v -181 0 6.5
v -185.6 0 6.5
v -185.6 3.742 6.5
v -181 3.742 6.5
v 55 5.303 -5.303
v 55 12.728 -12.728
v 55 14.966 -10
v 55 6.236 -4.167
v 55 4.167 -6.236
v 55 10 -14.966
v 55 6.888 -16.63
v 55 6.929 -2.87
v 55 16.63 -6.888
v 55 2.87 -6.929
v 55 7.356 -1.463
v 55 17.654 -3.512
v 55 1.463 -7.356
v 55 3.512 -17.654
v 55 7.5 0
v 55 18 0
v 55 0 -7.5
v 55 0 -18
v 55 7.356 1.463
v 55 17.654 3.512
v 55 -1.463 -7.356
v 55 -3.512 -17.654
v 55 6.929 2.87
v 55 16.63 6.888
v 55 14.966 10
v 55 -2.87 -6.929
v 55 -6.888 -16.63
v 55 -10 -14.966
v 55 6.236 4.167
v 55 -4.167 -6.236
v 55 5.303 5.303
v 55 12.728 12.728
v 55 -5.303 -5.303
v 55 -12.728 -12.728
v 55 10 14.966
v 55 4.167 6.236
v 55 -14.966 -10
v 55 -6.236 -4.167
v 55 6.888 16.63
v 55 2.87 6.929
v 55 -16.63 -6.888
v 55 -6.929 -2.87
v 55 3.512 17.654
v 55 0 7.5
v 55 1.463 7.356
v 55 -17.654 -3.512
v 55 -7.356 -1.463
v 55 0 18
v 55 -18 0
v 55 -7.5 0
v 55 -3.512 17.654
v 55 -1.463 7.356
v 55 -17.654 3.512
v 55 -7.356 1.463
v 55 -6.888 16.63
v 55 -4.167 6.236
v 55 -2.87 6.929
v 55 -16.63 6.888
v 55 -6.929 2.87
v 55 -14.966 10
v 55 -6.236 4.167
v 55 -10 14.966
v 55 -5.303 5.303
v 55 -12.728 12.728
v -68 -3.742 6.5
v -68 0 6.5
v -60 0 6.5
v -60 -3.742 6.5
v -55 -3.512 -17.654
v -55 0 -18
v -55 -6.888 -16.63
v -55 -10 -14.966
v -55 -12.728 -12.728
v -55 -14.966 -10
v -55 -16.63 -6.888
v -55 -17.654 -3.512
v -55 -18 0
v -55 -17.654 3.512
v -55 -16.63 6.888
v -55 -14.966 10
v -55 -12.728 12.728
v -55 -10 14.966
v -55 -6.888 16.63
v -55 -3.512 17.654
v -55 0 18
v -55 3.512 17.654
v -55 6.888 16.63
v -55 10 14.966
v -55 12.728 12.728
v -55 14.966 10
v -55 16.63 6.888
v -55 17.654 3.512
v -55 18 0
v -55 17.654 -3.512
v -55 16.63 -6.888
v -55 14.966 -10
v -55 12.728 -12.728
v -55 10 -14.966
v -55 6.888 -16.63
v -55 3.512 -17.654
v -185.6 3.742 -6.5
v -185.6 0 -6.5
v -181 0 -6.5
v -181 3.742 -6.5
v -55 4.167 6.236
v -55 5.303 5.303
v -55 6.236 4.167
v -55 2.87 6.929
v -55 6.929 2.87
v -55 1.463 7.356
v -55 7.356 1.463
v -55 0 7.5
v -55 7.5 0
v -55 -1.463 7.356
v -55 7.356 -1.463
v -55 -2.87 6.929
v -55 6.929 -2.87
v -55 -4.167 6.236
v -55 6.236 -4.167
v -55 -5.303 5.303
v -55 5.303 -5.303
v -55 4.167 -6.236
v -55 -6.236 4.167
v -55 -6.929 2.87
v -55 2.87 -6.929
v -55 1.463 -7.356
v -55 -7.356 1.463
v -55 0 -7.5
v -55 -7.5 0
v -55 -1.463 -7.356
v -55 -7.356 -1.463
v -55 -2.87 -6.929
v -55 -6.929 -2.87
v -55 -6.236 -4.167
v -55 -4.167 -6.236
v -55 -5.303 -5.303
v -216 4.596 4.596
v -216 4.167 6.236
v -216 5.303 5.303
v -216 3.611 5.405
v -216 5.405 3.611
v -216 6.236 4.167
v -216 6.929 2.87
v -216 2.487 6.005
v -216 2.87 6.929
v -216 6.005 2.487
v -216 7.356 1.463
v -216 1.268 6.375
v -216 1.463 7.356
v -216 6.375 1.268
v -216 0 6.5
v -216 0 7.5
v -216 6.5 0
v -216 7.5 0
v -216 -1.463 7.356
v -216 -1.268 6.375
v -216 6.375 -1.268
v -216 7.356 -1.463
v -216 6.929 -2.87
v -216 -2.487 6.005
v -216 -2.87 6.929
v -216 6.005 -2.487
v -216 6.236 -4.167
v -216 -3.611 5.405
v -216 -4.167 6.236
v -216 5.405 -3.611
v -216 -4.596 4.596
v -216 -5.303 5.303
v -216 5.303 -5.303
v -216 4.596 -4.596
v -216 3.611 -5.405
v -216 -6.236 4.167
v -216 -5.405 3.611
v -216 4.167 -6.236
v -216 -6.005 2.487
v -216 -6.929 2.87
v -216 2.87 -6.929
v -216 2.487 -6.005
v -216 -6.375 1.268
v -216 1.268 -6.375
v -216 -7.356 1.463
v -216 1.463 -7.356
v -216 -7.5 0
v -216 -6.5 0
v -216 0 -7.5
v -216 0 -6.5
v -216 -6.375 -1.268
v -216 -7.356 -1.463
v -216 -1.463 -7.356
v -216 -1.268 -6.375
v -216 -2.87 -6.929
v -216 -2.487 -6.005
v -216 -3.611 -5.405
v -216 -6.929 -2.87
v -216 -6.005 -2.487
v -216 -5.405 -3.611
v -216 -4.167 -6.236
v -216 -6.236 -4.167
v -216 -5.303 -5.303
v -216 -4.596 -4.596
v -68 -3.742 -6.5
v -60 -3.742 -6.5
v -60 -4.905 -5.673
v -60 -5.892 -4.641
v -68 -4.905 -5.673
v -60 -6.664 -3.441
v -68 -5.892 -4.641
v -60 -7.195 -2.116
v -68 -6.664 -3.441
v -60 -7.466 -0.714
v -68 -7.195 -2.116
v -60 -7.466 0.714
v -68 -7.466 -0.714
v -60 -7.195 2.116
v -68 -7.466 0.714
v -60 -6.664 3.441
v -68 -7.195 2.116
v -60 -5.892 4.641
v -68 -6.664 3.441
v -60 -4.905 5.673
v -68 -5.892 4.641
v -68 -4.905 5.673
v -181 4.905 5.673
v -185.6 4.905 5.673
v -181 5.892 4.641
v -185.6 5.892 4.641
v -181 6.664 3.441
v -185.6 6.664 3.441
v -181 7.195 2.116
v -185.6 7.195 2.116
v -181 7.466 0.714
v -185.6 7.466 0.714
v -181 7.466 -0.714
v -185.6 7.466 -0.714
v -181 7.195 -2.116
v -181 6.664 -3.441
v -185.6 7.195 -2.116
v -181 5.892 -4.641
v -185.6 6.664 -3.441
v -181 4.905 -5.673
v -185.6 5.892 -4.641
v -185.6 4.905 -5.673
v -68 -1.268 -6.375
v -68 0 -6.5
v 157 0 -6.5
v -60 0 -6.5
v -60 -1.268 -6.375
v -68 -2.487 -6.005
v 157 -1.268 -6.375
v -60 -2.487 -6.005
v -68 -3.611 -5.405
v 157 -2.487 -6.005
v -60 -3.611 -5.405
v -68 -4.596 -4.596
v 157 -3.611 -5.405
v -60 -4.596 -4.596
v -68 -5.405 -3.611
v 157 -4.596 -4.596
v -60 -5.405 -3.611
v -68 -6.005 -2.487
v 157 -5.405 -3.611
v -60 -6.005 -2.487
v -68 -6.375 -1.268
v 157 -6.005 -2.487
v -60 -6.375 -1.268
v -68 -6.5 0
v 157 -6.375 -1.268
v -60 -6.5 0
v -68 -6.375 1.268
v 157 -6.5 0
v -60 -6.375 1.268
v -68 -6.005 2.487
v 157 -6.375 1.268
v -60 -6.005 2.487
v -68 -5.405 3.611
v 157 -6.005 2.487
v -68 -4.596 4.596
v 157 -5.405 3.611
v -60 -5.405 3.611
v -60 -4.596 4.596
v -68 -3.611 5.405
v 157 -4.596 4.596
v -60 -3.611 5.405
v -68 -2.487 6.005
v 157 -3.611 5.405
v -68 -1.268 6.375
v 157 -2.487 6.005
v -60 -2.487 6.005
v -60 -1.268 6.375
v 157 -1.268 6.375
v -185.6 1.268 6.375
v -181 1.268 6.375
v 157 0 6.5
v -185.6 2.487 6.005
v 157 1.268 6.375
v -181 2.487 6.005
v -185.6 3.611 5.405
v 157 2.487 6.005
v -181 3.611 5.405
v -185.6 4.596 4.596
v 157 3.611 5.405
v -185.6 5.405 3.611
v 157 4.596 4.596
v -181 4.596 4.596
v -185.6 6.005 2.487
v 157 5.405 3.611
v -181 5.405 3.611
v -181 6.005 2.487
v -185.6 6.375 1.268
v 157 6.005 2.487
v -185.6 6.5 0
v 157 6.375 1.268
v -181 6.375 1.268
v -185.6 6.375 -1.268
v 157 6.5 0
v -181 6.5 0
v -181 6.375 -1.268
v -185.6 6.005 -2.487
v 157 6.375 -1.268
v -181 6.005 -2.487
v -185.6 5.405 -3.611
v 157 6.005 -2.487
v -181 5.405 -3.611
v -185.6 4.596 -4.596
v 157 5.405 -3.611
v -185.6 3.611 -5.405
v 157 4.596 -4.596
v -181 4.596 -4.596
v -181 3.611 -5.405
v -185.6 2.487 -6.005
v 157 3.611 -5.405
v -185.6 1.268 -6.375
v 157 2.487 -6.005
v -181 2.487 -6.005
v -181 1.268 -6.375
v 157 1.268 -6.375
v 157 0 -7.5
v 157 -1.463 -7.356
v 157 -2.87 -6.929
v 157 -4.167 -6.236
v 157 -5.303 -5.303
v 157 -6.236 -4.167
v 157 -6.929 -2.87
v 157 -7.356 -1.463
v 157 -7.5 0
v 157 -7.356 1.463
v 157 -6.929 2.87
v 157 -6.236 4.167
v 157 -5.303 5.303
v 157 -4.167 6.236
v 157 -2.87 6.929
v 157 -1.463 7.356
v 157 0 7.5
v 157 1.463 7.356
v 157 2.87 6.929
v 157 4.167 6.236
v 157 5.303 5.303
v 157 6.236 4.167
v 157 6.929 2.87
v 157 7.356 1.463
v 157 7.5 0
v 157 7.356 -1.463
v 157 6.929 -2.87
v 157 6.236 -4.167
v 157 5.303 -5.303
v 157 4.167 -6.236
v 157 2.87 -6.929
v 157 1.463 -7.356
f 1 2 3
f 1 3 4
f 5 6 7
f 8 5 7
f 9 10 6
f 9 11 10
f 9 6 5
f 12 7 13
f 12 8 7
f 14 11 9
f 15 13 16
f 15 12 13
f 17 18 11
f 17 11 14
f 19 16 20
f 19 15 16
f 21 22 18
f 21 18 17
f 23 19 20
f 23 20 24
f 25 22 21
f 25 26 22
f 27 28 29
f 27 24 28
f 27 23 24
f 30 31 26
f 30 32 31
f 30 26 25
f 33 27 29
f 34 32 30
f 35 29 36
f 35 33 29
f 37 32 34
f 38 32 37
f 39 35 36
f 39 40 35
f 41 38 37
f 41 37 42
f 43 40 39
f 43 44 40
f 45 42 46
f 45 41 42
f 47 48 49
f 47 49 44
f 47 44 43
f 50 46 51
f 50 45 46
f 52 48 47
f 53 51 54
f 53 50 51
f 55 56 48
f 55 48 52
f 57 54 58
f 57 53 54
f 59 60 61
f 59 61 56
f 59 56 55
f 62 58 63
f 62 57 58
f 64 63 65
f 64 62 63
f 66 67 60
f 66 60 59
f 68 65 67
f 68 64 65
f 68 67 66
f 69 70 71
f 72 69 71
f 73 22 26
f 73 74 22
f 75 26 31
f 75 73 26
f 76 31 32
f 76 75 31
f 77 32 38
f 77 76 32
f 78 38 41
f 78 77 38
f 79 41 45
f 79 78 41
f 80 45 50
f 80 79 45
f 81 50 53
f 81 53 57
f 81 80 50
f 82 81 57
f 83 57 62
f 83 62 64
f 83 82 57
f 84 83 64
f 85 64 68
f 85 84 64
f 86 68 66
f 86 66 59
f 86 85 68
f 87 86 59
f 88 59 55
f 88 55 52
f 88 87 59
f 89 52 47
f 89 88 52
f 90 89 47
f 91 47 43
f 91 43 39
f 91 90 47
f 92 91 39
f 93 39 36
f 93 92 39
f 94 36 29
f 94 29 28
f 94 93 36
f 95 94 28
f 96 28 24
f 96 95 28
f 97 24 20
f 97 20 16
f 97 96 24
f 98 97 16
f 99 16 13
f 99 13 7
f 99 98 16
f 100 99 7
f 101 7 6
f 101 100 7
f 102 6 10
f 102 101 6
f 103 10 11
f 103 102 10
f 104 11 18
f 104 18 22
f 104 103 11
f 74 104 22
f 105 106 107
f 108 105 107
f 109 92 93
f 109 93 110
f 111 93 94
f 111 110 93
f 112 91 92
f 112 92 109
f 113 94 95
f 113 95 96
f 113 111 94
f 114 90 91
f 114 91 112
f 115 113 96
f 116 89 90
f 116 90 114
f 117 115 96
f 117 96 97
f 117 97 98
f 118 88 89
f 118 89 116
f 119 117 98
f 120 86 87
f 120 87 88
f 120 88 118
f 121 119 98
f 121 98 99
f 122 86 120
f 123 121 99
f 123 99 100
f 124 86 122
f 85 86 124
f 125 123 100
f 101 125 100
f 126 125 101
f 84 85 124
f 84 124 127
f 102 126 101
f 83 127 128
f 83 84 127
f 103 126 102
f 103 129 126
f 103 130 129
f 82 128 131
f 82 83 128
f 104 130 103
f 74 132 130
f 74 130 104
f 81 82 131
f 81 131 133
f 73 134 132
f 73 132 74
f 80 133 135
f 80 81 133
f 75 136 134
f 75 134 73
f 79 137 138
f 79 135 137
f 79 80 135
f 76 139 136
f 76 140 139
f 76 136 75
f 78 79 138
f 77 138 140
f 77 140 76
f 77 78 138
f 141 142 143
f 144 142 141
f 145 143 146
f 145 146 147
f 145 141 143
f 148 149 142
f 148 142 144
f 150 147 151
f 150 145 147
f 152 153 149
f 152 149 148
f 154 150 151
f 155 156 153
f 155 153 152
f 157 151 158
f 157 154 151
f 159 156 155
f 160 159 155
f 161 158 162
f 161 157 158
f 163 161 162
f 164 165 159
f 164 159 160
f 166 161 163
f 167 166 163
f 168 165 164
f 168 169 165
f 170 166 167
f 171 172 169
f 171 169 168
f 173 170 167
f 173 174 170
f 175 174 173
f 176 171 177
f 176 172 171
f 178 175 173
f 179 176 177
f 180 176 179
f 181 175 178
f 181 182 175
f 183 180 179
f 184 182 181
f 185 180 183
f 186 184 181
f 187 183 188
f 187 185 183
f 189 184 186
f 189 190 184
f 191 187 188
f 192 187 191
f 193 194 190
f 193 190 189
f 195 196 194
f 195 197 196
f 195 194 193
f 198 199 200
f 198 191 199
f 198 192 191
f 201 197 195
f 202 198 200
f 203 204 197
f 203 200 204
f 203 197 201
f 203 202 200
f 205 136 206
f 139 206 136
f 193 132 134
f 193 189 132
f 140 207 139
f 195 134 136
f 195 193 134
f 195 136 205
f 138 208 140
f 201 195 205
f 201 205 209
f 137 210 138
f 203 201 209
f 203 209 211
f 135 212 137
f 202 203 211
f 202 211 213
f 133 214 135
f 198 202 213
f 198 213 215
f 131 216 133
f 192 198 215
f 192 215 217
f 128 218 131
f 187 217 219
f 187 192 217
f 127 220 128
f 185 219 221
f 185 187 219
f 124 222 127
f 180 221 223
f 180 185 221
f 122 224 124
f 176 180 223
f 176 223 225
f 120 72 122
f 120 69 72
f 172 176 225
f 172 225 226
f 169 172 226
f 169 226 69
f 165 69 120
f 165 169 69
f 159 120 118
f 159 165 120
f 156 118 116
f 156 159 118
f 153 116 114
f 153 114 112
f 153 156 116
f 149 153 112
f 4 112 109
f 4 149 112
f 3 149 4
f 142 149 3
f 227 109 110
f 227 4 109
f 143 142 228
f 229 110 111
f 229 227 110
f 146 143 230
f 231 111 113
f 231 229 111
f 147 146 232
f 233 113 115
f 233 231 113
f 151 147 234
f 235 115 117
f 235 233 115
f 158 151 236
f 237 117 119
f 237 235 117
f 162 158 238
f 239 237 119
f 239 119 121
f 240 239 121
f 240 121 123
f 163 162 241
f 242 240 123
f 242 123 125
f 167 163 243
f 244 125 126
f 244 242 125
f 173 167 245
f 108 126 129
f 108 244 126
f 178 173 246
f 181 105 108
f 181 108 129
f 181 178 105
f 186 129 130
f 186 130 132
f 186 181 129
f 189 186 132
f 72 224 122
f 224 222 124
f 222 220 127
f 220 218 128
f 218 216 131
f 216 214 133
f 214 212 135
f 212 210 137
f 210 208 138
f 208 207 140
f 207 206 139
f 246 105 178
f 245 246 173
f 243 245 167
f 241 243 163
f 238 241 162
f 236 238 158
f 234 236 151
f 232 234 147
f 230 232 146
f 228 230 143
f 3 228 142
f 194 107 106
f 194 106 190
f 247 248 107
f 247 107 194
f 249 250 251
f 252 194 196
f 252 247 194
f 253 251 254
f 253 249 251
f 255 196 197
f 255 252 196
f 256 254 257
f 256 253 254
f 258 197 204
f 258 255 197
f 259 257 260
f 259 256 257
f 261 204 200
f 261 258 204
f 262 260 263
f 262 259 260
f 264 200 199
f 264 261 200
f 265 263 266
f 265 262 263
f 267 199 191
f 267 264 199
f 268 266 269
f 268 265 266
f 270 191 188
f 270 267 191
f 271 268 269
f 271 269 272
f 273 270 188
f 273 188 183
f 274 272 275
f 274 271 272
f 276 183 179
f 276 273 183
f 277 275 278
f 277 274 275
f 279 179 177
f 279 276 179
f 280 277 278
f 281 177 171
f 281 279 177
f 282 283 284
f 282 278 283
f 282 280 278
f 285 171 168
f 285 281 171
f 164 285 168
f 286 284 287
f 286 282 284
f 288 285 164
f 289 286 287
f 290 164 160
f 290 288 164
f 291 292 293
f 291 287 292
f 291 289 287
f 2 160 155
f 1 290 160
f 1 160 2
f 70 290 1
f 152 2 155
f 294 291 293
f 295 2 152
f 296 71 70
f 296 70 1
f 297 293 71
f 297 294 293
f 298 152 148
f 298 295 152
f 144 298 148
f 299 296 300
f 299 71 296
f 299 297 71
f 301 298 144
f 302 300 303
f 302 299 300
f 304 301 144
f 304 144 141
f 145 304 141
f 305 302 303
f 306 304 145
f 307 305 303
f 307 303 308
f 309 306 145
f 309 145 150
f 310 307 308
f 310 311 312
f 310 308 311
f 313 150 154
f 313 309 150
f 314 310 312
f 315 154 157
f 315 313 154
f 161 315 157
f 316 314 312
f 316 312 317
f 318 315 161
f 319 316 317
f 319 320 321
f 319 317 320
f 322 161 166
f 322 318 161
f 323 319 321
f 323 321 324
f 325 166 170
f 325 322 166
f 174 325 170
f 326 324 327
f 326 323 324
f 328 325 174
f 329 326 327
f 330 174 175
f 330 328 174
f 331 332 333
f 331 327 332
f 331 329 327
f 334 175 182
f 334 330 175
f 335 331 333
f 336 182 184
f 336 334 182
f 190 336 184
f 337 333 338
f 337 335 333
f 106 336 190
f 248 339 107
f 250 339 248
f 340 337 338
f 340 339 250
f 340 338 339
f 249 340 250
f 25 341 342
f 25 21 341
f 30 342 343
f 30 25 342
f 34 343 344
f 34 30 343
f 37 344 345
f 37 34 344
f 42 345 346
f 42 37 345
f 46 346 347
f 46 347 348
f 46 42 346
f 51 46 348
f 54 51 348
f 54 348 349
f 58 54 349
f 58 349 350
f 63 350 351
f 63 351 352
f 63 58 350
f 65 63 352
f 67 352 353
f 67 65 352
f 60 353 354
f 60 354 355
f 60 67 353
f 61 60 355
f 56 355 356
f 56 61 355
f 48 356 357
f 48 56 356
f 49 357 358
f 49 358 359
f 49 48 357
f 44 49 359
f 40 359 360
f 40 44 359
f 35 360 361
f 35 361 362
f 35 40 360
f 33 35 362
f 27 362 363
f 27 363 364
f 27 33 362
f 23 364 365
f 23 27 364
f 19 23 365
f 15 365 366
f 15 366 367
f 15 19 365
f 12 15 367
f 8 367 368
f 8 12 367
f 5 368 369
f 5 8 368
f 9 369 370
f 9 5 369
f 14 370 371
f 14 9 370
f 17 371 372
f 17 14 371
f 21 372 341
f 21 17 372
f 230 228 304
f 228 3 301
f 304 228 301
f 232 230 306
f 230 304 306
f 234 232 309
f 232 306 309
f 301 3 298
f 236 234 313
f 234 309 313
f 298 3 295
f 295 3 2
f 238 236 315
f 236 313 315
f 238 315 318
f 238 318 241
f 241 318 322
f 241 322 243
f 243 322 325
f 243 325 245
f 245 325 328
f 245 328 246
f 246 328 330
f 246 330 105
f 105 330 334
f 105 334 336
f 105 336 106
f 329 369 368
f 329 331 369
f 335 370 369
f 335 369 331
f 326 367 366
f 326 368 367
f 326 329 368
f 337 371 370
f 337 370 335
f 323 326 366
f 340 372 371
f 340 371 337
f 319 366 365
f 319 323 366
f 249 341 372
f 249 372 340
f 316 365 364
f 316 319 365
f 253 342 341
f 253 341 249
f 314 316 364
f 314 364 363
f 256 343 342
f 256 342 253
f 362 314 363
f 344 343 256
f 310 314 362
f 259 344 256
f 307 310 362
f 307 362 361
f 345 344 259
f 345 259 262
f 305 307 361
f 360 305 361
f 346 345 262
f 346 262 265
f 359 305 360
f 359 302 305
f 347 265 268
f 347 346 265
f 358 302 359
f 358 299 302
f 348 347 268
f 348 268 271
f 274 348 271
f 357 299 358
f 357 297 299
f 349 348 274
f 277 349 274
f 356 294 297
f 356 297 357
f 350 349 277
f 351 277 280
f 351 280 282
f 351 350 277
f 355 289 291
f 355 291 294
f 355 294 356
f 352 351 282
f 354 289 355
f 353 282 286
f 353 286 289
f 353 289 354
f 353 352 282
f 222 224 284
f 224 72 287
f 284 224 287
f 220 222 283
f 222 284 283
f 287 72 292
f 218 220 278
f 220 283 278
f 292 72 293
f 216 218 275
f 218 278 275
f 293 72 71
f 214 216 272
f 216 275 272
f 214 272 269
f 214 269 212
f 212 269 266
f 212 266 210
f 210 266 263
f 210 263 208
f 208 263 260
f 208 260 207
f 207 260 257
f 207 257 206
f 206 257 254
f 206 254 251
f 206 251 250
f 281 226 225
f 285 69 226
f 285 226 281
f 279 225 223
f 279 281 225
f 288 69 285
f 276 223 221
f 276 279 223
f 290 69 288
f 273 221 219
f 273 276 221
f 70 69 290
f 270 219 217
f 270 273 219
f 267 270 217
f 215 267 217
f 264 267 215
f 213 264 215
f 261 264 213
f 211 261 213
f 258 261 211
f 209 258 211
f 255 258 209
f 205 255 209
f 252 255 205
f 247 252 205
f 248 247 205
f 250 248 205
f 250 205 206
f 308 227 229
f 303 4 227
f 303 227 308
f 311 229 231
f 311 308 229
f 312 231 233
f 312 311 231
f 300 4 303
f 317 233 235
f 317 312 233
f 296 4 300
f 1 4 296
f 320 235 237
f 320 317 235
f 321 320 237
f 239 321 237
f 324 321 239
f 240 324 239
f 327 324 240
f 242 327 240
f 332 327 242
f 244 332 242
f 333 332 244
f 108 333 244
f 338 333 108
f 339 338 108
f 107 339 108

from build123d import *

# Parameters (mm, degrees)
CUT_EXTRUDE1_REACH      = 219.495
CUT_EXTRUDE1_END_RADIUS = 7.5
SKETCH2_W               = 8
SKETCH2_H               = 13
CUT_EXTRUDE2_REACH      = 219.495
CUT_EXTRUDE2_END_RADIUS = 7.5
SKETCH2_3_W             = 4.6
SKETCH2_3_H             = 13


with BuildPart() as part:
    # Sketch1 → Revolve1 (revolve)
    with BuildSketch(Plane.XY, mode=Mode.PRIVATE) as revolve1_sk:
        Polygon((157, 6.5), (157, 7.5), (55, 7.5), (55, 18), (-55, 18), (-55, 7.5), (-216, 7.5), (-216, 6.5), align=None)
    revolve(revolve1_sk.sketch.rotate(Axis((196.356223274, 0, 0), (-1, 0, 0)), 90), axis=Axis((196.356223274, 0, 0), (-1, 0, 0)))

    # Cut-Extrude1: up to this cylinder (the profile starts inside it)
    cut_extrude1_end = Plane(origin=(-64, 0, 0), z_dir=(1, 0, 0)) * Cylinder(CUT_EXTRUDE1_END_RADIUS, 454.99, mode=Mode.PRIVATE)
    # Sketch2 → Cut-Extrude1 (cut, up to the surface)
    with BuildSketch(Plane(origin=(0, 0, 0), x_dir=(1, 0, 0), z_dir=(0, 1, 0)), mode=Mode.PRIVATE) as cut_extrude1_sk1:
        with Locations((-64, 0)):
            Rectangle(SKETCH2_W, SKETCH2_H)
    cut_extrude1_tool1 = extrude(cut_extrude1_sk1.sketch, amount=-CUT_EXTRUDE1_REACH, mode=Mode.PRIVATE) & cut_extrude1_end
    add(cut_extrude1_tool1.solids().sort_by_distance((-64, 0, 0))[0], mode=Mode.SUBTRACT)

    # Cut-Extrude2: up to this cylinder (the profile starts inside it)
    cut_extrude2_end = Plane(origin=(-183.3, 0, 0), z_dir=(1, 0, 0)) * Cylinder(CUT_EXTRUDE2_END_RADIUS, 454.99, mode=Mode.PRIVATE)
    # Sketch2<3> → Cut-Extrude2 (cut, up to the surface)
    with BuildSketch(Plane(origin=(0, 0, 0), x_dir=(1, 0, 0), z_dir=(0, 1, 0)), mode=Mode.PRIVATE) as cut_extrude2_sk1:
        with Locations((-183.3, 0)):
            Rectangle(SKETCH2_3_W, SKETCH2_3_H)
    cut_extrude2_tool1 = extrude(cut_extrude2_sk1.sketch, amount=CUT_EXTRUDE2_REACH, mode=Mode.PRIVATE) & cut_extrude2_end
    add(cut_extrude2_tool1.solids().sort_by_distance((-183.3, 0, 0))[0], mode=Mode.SUBTRACT)


solid = part.part
